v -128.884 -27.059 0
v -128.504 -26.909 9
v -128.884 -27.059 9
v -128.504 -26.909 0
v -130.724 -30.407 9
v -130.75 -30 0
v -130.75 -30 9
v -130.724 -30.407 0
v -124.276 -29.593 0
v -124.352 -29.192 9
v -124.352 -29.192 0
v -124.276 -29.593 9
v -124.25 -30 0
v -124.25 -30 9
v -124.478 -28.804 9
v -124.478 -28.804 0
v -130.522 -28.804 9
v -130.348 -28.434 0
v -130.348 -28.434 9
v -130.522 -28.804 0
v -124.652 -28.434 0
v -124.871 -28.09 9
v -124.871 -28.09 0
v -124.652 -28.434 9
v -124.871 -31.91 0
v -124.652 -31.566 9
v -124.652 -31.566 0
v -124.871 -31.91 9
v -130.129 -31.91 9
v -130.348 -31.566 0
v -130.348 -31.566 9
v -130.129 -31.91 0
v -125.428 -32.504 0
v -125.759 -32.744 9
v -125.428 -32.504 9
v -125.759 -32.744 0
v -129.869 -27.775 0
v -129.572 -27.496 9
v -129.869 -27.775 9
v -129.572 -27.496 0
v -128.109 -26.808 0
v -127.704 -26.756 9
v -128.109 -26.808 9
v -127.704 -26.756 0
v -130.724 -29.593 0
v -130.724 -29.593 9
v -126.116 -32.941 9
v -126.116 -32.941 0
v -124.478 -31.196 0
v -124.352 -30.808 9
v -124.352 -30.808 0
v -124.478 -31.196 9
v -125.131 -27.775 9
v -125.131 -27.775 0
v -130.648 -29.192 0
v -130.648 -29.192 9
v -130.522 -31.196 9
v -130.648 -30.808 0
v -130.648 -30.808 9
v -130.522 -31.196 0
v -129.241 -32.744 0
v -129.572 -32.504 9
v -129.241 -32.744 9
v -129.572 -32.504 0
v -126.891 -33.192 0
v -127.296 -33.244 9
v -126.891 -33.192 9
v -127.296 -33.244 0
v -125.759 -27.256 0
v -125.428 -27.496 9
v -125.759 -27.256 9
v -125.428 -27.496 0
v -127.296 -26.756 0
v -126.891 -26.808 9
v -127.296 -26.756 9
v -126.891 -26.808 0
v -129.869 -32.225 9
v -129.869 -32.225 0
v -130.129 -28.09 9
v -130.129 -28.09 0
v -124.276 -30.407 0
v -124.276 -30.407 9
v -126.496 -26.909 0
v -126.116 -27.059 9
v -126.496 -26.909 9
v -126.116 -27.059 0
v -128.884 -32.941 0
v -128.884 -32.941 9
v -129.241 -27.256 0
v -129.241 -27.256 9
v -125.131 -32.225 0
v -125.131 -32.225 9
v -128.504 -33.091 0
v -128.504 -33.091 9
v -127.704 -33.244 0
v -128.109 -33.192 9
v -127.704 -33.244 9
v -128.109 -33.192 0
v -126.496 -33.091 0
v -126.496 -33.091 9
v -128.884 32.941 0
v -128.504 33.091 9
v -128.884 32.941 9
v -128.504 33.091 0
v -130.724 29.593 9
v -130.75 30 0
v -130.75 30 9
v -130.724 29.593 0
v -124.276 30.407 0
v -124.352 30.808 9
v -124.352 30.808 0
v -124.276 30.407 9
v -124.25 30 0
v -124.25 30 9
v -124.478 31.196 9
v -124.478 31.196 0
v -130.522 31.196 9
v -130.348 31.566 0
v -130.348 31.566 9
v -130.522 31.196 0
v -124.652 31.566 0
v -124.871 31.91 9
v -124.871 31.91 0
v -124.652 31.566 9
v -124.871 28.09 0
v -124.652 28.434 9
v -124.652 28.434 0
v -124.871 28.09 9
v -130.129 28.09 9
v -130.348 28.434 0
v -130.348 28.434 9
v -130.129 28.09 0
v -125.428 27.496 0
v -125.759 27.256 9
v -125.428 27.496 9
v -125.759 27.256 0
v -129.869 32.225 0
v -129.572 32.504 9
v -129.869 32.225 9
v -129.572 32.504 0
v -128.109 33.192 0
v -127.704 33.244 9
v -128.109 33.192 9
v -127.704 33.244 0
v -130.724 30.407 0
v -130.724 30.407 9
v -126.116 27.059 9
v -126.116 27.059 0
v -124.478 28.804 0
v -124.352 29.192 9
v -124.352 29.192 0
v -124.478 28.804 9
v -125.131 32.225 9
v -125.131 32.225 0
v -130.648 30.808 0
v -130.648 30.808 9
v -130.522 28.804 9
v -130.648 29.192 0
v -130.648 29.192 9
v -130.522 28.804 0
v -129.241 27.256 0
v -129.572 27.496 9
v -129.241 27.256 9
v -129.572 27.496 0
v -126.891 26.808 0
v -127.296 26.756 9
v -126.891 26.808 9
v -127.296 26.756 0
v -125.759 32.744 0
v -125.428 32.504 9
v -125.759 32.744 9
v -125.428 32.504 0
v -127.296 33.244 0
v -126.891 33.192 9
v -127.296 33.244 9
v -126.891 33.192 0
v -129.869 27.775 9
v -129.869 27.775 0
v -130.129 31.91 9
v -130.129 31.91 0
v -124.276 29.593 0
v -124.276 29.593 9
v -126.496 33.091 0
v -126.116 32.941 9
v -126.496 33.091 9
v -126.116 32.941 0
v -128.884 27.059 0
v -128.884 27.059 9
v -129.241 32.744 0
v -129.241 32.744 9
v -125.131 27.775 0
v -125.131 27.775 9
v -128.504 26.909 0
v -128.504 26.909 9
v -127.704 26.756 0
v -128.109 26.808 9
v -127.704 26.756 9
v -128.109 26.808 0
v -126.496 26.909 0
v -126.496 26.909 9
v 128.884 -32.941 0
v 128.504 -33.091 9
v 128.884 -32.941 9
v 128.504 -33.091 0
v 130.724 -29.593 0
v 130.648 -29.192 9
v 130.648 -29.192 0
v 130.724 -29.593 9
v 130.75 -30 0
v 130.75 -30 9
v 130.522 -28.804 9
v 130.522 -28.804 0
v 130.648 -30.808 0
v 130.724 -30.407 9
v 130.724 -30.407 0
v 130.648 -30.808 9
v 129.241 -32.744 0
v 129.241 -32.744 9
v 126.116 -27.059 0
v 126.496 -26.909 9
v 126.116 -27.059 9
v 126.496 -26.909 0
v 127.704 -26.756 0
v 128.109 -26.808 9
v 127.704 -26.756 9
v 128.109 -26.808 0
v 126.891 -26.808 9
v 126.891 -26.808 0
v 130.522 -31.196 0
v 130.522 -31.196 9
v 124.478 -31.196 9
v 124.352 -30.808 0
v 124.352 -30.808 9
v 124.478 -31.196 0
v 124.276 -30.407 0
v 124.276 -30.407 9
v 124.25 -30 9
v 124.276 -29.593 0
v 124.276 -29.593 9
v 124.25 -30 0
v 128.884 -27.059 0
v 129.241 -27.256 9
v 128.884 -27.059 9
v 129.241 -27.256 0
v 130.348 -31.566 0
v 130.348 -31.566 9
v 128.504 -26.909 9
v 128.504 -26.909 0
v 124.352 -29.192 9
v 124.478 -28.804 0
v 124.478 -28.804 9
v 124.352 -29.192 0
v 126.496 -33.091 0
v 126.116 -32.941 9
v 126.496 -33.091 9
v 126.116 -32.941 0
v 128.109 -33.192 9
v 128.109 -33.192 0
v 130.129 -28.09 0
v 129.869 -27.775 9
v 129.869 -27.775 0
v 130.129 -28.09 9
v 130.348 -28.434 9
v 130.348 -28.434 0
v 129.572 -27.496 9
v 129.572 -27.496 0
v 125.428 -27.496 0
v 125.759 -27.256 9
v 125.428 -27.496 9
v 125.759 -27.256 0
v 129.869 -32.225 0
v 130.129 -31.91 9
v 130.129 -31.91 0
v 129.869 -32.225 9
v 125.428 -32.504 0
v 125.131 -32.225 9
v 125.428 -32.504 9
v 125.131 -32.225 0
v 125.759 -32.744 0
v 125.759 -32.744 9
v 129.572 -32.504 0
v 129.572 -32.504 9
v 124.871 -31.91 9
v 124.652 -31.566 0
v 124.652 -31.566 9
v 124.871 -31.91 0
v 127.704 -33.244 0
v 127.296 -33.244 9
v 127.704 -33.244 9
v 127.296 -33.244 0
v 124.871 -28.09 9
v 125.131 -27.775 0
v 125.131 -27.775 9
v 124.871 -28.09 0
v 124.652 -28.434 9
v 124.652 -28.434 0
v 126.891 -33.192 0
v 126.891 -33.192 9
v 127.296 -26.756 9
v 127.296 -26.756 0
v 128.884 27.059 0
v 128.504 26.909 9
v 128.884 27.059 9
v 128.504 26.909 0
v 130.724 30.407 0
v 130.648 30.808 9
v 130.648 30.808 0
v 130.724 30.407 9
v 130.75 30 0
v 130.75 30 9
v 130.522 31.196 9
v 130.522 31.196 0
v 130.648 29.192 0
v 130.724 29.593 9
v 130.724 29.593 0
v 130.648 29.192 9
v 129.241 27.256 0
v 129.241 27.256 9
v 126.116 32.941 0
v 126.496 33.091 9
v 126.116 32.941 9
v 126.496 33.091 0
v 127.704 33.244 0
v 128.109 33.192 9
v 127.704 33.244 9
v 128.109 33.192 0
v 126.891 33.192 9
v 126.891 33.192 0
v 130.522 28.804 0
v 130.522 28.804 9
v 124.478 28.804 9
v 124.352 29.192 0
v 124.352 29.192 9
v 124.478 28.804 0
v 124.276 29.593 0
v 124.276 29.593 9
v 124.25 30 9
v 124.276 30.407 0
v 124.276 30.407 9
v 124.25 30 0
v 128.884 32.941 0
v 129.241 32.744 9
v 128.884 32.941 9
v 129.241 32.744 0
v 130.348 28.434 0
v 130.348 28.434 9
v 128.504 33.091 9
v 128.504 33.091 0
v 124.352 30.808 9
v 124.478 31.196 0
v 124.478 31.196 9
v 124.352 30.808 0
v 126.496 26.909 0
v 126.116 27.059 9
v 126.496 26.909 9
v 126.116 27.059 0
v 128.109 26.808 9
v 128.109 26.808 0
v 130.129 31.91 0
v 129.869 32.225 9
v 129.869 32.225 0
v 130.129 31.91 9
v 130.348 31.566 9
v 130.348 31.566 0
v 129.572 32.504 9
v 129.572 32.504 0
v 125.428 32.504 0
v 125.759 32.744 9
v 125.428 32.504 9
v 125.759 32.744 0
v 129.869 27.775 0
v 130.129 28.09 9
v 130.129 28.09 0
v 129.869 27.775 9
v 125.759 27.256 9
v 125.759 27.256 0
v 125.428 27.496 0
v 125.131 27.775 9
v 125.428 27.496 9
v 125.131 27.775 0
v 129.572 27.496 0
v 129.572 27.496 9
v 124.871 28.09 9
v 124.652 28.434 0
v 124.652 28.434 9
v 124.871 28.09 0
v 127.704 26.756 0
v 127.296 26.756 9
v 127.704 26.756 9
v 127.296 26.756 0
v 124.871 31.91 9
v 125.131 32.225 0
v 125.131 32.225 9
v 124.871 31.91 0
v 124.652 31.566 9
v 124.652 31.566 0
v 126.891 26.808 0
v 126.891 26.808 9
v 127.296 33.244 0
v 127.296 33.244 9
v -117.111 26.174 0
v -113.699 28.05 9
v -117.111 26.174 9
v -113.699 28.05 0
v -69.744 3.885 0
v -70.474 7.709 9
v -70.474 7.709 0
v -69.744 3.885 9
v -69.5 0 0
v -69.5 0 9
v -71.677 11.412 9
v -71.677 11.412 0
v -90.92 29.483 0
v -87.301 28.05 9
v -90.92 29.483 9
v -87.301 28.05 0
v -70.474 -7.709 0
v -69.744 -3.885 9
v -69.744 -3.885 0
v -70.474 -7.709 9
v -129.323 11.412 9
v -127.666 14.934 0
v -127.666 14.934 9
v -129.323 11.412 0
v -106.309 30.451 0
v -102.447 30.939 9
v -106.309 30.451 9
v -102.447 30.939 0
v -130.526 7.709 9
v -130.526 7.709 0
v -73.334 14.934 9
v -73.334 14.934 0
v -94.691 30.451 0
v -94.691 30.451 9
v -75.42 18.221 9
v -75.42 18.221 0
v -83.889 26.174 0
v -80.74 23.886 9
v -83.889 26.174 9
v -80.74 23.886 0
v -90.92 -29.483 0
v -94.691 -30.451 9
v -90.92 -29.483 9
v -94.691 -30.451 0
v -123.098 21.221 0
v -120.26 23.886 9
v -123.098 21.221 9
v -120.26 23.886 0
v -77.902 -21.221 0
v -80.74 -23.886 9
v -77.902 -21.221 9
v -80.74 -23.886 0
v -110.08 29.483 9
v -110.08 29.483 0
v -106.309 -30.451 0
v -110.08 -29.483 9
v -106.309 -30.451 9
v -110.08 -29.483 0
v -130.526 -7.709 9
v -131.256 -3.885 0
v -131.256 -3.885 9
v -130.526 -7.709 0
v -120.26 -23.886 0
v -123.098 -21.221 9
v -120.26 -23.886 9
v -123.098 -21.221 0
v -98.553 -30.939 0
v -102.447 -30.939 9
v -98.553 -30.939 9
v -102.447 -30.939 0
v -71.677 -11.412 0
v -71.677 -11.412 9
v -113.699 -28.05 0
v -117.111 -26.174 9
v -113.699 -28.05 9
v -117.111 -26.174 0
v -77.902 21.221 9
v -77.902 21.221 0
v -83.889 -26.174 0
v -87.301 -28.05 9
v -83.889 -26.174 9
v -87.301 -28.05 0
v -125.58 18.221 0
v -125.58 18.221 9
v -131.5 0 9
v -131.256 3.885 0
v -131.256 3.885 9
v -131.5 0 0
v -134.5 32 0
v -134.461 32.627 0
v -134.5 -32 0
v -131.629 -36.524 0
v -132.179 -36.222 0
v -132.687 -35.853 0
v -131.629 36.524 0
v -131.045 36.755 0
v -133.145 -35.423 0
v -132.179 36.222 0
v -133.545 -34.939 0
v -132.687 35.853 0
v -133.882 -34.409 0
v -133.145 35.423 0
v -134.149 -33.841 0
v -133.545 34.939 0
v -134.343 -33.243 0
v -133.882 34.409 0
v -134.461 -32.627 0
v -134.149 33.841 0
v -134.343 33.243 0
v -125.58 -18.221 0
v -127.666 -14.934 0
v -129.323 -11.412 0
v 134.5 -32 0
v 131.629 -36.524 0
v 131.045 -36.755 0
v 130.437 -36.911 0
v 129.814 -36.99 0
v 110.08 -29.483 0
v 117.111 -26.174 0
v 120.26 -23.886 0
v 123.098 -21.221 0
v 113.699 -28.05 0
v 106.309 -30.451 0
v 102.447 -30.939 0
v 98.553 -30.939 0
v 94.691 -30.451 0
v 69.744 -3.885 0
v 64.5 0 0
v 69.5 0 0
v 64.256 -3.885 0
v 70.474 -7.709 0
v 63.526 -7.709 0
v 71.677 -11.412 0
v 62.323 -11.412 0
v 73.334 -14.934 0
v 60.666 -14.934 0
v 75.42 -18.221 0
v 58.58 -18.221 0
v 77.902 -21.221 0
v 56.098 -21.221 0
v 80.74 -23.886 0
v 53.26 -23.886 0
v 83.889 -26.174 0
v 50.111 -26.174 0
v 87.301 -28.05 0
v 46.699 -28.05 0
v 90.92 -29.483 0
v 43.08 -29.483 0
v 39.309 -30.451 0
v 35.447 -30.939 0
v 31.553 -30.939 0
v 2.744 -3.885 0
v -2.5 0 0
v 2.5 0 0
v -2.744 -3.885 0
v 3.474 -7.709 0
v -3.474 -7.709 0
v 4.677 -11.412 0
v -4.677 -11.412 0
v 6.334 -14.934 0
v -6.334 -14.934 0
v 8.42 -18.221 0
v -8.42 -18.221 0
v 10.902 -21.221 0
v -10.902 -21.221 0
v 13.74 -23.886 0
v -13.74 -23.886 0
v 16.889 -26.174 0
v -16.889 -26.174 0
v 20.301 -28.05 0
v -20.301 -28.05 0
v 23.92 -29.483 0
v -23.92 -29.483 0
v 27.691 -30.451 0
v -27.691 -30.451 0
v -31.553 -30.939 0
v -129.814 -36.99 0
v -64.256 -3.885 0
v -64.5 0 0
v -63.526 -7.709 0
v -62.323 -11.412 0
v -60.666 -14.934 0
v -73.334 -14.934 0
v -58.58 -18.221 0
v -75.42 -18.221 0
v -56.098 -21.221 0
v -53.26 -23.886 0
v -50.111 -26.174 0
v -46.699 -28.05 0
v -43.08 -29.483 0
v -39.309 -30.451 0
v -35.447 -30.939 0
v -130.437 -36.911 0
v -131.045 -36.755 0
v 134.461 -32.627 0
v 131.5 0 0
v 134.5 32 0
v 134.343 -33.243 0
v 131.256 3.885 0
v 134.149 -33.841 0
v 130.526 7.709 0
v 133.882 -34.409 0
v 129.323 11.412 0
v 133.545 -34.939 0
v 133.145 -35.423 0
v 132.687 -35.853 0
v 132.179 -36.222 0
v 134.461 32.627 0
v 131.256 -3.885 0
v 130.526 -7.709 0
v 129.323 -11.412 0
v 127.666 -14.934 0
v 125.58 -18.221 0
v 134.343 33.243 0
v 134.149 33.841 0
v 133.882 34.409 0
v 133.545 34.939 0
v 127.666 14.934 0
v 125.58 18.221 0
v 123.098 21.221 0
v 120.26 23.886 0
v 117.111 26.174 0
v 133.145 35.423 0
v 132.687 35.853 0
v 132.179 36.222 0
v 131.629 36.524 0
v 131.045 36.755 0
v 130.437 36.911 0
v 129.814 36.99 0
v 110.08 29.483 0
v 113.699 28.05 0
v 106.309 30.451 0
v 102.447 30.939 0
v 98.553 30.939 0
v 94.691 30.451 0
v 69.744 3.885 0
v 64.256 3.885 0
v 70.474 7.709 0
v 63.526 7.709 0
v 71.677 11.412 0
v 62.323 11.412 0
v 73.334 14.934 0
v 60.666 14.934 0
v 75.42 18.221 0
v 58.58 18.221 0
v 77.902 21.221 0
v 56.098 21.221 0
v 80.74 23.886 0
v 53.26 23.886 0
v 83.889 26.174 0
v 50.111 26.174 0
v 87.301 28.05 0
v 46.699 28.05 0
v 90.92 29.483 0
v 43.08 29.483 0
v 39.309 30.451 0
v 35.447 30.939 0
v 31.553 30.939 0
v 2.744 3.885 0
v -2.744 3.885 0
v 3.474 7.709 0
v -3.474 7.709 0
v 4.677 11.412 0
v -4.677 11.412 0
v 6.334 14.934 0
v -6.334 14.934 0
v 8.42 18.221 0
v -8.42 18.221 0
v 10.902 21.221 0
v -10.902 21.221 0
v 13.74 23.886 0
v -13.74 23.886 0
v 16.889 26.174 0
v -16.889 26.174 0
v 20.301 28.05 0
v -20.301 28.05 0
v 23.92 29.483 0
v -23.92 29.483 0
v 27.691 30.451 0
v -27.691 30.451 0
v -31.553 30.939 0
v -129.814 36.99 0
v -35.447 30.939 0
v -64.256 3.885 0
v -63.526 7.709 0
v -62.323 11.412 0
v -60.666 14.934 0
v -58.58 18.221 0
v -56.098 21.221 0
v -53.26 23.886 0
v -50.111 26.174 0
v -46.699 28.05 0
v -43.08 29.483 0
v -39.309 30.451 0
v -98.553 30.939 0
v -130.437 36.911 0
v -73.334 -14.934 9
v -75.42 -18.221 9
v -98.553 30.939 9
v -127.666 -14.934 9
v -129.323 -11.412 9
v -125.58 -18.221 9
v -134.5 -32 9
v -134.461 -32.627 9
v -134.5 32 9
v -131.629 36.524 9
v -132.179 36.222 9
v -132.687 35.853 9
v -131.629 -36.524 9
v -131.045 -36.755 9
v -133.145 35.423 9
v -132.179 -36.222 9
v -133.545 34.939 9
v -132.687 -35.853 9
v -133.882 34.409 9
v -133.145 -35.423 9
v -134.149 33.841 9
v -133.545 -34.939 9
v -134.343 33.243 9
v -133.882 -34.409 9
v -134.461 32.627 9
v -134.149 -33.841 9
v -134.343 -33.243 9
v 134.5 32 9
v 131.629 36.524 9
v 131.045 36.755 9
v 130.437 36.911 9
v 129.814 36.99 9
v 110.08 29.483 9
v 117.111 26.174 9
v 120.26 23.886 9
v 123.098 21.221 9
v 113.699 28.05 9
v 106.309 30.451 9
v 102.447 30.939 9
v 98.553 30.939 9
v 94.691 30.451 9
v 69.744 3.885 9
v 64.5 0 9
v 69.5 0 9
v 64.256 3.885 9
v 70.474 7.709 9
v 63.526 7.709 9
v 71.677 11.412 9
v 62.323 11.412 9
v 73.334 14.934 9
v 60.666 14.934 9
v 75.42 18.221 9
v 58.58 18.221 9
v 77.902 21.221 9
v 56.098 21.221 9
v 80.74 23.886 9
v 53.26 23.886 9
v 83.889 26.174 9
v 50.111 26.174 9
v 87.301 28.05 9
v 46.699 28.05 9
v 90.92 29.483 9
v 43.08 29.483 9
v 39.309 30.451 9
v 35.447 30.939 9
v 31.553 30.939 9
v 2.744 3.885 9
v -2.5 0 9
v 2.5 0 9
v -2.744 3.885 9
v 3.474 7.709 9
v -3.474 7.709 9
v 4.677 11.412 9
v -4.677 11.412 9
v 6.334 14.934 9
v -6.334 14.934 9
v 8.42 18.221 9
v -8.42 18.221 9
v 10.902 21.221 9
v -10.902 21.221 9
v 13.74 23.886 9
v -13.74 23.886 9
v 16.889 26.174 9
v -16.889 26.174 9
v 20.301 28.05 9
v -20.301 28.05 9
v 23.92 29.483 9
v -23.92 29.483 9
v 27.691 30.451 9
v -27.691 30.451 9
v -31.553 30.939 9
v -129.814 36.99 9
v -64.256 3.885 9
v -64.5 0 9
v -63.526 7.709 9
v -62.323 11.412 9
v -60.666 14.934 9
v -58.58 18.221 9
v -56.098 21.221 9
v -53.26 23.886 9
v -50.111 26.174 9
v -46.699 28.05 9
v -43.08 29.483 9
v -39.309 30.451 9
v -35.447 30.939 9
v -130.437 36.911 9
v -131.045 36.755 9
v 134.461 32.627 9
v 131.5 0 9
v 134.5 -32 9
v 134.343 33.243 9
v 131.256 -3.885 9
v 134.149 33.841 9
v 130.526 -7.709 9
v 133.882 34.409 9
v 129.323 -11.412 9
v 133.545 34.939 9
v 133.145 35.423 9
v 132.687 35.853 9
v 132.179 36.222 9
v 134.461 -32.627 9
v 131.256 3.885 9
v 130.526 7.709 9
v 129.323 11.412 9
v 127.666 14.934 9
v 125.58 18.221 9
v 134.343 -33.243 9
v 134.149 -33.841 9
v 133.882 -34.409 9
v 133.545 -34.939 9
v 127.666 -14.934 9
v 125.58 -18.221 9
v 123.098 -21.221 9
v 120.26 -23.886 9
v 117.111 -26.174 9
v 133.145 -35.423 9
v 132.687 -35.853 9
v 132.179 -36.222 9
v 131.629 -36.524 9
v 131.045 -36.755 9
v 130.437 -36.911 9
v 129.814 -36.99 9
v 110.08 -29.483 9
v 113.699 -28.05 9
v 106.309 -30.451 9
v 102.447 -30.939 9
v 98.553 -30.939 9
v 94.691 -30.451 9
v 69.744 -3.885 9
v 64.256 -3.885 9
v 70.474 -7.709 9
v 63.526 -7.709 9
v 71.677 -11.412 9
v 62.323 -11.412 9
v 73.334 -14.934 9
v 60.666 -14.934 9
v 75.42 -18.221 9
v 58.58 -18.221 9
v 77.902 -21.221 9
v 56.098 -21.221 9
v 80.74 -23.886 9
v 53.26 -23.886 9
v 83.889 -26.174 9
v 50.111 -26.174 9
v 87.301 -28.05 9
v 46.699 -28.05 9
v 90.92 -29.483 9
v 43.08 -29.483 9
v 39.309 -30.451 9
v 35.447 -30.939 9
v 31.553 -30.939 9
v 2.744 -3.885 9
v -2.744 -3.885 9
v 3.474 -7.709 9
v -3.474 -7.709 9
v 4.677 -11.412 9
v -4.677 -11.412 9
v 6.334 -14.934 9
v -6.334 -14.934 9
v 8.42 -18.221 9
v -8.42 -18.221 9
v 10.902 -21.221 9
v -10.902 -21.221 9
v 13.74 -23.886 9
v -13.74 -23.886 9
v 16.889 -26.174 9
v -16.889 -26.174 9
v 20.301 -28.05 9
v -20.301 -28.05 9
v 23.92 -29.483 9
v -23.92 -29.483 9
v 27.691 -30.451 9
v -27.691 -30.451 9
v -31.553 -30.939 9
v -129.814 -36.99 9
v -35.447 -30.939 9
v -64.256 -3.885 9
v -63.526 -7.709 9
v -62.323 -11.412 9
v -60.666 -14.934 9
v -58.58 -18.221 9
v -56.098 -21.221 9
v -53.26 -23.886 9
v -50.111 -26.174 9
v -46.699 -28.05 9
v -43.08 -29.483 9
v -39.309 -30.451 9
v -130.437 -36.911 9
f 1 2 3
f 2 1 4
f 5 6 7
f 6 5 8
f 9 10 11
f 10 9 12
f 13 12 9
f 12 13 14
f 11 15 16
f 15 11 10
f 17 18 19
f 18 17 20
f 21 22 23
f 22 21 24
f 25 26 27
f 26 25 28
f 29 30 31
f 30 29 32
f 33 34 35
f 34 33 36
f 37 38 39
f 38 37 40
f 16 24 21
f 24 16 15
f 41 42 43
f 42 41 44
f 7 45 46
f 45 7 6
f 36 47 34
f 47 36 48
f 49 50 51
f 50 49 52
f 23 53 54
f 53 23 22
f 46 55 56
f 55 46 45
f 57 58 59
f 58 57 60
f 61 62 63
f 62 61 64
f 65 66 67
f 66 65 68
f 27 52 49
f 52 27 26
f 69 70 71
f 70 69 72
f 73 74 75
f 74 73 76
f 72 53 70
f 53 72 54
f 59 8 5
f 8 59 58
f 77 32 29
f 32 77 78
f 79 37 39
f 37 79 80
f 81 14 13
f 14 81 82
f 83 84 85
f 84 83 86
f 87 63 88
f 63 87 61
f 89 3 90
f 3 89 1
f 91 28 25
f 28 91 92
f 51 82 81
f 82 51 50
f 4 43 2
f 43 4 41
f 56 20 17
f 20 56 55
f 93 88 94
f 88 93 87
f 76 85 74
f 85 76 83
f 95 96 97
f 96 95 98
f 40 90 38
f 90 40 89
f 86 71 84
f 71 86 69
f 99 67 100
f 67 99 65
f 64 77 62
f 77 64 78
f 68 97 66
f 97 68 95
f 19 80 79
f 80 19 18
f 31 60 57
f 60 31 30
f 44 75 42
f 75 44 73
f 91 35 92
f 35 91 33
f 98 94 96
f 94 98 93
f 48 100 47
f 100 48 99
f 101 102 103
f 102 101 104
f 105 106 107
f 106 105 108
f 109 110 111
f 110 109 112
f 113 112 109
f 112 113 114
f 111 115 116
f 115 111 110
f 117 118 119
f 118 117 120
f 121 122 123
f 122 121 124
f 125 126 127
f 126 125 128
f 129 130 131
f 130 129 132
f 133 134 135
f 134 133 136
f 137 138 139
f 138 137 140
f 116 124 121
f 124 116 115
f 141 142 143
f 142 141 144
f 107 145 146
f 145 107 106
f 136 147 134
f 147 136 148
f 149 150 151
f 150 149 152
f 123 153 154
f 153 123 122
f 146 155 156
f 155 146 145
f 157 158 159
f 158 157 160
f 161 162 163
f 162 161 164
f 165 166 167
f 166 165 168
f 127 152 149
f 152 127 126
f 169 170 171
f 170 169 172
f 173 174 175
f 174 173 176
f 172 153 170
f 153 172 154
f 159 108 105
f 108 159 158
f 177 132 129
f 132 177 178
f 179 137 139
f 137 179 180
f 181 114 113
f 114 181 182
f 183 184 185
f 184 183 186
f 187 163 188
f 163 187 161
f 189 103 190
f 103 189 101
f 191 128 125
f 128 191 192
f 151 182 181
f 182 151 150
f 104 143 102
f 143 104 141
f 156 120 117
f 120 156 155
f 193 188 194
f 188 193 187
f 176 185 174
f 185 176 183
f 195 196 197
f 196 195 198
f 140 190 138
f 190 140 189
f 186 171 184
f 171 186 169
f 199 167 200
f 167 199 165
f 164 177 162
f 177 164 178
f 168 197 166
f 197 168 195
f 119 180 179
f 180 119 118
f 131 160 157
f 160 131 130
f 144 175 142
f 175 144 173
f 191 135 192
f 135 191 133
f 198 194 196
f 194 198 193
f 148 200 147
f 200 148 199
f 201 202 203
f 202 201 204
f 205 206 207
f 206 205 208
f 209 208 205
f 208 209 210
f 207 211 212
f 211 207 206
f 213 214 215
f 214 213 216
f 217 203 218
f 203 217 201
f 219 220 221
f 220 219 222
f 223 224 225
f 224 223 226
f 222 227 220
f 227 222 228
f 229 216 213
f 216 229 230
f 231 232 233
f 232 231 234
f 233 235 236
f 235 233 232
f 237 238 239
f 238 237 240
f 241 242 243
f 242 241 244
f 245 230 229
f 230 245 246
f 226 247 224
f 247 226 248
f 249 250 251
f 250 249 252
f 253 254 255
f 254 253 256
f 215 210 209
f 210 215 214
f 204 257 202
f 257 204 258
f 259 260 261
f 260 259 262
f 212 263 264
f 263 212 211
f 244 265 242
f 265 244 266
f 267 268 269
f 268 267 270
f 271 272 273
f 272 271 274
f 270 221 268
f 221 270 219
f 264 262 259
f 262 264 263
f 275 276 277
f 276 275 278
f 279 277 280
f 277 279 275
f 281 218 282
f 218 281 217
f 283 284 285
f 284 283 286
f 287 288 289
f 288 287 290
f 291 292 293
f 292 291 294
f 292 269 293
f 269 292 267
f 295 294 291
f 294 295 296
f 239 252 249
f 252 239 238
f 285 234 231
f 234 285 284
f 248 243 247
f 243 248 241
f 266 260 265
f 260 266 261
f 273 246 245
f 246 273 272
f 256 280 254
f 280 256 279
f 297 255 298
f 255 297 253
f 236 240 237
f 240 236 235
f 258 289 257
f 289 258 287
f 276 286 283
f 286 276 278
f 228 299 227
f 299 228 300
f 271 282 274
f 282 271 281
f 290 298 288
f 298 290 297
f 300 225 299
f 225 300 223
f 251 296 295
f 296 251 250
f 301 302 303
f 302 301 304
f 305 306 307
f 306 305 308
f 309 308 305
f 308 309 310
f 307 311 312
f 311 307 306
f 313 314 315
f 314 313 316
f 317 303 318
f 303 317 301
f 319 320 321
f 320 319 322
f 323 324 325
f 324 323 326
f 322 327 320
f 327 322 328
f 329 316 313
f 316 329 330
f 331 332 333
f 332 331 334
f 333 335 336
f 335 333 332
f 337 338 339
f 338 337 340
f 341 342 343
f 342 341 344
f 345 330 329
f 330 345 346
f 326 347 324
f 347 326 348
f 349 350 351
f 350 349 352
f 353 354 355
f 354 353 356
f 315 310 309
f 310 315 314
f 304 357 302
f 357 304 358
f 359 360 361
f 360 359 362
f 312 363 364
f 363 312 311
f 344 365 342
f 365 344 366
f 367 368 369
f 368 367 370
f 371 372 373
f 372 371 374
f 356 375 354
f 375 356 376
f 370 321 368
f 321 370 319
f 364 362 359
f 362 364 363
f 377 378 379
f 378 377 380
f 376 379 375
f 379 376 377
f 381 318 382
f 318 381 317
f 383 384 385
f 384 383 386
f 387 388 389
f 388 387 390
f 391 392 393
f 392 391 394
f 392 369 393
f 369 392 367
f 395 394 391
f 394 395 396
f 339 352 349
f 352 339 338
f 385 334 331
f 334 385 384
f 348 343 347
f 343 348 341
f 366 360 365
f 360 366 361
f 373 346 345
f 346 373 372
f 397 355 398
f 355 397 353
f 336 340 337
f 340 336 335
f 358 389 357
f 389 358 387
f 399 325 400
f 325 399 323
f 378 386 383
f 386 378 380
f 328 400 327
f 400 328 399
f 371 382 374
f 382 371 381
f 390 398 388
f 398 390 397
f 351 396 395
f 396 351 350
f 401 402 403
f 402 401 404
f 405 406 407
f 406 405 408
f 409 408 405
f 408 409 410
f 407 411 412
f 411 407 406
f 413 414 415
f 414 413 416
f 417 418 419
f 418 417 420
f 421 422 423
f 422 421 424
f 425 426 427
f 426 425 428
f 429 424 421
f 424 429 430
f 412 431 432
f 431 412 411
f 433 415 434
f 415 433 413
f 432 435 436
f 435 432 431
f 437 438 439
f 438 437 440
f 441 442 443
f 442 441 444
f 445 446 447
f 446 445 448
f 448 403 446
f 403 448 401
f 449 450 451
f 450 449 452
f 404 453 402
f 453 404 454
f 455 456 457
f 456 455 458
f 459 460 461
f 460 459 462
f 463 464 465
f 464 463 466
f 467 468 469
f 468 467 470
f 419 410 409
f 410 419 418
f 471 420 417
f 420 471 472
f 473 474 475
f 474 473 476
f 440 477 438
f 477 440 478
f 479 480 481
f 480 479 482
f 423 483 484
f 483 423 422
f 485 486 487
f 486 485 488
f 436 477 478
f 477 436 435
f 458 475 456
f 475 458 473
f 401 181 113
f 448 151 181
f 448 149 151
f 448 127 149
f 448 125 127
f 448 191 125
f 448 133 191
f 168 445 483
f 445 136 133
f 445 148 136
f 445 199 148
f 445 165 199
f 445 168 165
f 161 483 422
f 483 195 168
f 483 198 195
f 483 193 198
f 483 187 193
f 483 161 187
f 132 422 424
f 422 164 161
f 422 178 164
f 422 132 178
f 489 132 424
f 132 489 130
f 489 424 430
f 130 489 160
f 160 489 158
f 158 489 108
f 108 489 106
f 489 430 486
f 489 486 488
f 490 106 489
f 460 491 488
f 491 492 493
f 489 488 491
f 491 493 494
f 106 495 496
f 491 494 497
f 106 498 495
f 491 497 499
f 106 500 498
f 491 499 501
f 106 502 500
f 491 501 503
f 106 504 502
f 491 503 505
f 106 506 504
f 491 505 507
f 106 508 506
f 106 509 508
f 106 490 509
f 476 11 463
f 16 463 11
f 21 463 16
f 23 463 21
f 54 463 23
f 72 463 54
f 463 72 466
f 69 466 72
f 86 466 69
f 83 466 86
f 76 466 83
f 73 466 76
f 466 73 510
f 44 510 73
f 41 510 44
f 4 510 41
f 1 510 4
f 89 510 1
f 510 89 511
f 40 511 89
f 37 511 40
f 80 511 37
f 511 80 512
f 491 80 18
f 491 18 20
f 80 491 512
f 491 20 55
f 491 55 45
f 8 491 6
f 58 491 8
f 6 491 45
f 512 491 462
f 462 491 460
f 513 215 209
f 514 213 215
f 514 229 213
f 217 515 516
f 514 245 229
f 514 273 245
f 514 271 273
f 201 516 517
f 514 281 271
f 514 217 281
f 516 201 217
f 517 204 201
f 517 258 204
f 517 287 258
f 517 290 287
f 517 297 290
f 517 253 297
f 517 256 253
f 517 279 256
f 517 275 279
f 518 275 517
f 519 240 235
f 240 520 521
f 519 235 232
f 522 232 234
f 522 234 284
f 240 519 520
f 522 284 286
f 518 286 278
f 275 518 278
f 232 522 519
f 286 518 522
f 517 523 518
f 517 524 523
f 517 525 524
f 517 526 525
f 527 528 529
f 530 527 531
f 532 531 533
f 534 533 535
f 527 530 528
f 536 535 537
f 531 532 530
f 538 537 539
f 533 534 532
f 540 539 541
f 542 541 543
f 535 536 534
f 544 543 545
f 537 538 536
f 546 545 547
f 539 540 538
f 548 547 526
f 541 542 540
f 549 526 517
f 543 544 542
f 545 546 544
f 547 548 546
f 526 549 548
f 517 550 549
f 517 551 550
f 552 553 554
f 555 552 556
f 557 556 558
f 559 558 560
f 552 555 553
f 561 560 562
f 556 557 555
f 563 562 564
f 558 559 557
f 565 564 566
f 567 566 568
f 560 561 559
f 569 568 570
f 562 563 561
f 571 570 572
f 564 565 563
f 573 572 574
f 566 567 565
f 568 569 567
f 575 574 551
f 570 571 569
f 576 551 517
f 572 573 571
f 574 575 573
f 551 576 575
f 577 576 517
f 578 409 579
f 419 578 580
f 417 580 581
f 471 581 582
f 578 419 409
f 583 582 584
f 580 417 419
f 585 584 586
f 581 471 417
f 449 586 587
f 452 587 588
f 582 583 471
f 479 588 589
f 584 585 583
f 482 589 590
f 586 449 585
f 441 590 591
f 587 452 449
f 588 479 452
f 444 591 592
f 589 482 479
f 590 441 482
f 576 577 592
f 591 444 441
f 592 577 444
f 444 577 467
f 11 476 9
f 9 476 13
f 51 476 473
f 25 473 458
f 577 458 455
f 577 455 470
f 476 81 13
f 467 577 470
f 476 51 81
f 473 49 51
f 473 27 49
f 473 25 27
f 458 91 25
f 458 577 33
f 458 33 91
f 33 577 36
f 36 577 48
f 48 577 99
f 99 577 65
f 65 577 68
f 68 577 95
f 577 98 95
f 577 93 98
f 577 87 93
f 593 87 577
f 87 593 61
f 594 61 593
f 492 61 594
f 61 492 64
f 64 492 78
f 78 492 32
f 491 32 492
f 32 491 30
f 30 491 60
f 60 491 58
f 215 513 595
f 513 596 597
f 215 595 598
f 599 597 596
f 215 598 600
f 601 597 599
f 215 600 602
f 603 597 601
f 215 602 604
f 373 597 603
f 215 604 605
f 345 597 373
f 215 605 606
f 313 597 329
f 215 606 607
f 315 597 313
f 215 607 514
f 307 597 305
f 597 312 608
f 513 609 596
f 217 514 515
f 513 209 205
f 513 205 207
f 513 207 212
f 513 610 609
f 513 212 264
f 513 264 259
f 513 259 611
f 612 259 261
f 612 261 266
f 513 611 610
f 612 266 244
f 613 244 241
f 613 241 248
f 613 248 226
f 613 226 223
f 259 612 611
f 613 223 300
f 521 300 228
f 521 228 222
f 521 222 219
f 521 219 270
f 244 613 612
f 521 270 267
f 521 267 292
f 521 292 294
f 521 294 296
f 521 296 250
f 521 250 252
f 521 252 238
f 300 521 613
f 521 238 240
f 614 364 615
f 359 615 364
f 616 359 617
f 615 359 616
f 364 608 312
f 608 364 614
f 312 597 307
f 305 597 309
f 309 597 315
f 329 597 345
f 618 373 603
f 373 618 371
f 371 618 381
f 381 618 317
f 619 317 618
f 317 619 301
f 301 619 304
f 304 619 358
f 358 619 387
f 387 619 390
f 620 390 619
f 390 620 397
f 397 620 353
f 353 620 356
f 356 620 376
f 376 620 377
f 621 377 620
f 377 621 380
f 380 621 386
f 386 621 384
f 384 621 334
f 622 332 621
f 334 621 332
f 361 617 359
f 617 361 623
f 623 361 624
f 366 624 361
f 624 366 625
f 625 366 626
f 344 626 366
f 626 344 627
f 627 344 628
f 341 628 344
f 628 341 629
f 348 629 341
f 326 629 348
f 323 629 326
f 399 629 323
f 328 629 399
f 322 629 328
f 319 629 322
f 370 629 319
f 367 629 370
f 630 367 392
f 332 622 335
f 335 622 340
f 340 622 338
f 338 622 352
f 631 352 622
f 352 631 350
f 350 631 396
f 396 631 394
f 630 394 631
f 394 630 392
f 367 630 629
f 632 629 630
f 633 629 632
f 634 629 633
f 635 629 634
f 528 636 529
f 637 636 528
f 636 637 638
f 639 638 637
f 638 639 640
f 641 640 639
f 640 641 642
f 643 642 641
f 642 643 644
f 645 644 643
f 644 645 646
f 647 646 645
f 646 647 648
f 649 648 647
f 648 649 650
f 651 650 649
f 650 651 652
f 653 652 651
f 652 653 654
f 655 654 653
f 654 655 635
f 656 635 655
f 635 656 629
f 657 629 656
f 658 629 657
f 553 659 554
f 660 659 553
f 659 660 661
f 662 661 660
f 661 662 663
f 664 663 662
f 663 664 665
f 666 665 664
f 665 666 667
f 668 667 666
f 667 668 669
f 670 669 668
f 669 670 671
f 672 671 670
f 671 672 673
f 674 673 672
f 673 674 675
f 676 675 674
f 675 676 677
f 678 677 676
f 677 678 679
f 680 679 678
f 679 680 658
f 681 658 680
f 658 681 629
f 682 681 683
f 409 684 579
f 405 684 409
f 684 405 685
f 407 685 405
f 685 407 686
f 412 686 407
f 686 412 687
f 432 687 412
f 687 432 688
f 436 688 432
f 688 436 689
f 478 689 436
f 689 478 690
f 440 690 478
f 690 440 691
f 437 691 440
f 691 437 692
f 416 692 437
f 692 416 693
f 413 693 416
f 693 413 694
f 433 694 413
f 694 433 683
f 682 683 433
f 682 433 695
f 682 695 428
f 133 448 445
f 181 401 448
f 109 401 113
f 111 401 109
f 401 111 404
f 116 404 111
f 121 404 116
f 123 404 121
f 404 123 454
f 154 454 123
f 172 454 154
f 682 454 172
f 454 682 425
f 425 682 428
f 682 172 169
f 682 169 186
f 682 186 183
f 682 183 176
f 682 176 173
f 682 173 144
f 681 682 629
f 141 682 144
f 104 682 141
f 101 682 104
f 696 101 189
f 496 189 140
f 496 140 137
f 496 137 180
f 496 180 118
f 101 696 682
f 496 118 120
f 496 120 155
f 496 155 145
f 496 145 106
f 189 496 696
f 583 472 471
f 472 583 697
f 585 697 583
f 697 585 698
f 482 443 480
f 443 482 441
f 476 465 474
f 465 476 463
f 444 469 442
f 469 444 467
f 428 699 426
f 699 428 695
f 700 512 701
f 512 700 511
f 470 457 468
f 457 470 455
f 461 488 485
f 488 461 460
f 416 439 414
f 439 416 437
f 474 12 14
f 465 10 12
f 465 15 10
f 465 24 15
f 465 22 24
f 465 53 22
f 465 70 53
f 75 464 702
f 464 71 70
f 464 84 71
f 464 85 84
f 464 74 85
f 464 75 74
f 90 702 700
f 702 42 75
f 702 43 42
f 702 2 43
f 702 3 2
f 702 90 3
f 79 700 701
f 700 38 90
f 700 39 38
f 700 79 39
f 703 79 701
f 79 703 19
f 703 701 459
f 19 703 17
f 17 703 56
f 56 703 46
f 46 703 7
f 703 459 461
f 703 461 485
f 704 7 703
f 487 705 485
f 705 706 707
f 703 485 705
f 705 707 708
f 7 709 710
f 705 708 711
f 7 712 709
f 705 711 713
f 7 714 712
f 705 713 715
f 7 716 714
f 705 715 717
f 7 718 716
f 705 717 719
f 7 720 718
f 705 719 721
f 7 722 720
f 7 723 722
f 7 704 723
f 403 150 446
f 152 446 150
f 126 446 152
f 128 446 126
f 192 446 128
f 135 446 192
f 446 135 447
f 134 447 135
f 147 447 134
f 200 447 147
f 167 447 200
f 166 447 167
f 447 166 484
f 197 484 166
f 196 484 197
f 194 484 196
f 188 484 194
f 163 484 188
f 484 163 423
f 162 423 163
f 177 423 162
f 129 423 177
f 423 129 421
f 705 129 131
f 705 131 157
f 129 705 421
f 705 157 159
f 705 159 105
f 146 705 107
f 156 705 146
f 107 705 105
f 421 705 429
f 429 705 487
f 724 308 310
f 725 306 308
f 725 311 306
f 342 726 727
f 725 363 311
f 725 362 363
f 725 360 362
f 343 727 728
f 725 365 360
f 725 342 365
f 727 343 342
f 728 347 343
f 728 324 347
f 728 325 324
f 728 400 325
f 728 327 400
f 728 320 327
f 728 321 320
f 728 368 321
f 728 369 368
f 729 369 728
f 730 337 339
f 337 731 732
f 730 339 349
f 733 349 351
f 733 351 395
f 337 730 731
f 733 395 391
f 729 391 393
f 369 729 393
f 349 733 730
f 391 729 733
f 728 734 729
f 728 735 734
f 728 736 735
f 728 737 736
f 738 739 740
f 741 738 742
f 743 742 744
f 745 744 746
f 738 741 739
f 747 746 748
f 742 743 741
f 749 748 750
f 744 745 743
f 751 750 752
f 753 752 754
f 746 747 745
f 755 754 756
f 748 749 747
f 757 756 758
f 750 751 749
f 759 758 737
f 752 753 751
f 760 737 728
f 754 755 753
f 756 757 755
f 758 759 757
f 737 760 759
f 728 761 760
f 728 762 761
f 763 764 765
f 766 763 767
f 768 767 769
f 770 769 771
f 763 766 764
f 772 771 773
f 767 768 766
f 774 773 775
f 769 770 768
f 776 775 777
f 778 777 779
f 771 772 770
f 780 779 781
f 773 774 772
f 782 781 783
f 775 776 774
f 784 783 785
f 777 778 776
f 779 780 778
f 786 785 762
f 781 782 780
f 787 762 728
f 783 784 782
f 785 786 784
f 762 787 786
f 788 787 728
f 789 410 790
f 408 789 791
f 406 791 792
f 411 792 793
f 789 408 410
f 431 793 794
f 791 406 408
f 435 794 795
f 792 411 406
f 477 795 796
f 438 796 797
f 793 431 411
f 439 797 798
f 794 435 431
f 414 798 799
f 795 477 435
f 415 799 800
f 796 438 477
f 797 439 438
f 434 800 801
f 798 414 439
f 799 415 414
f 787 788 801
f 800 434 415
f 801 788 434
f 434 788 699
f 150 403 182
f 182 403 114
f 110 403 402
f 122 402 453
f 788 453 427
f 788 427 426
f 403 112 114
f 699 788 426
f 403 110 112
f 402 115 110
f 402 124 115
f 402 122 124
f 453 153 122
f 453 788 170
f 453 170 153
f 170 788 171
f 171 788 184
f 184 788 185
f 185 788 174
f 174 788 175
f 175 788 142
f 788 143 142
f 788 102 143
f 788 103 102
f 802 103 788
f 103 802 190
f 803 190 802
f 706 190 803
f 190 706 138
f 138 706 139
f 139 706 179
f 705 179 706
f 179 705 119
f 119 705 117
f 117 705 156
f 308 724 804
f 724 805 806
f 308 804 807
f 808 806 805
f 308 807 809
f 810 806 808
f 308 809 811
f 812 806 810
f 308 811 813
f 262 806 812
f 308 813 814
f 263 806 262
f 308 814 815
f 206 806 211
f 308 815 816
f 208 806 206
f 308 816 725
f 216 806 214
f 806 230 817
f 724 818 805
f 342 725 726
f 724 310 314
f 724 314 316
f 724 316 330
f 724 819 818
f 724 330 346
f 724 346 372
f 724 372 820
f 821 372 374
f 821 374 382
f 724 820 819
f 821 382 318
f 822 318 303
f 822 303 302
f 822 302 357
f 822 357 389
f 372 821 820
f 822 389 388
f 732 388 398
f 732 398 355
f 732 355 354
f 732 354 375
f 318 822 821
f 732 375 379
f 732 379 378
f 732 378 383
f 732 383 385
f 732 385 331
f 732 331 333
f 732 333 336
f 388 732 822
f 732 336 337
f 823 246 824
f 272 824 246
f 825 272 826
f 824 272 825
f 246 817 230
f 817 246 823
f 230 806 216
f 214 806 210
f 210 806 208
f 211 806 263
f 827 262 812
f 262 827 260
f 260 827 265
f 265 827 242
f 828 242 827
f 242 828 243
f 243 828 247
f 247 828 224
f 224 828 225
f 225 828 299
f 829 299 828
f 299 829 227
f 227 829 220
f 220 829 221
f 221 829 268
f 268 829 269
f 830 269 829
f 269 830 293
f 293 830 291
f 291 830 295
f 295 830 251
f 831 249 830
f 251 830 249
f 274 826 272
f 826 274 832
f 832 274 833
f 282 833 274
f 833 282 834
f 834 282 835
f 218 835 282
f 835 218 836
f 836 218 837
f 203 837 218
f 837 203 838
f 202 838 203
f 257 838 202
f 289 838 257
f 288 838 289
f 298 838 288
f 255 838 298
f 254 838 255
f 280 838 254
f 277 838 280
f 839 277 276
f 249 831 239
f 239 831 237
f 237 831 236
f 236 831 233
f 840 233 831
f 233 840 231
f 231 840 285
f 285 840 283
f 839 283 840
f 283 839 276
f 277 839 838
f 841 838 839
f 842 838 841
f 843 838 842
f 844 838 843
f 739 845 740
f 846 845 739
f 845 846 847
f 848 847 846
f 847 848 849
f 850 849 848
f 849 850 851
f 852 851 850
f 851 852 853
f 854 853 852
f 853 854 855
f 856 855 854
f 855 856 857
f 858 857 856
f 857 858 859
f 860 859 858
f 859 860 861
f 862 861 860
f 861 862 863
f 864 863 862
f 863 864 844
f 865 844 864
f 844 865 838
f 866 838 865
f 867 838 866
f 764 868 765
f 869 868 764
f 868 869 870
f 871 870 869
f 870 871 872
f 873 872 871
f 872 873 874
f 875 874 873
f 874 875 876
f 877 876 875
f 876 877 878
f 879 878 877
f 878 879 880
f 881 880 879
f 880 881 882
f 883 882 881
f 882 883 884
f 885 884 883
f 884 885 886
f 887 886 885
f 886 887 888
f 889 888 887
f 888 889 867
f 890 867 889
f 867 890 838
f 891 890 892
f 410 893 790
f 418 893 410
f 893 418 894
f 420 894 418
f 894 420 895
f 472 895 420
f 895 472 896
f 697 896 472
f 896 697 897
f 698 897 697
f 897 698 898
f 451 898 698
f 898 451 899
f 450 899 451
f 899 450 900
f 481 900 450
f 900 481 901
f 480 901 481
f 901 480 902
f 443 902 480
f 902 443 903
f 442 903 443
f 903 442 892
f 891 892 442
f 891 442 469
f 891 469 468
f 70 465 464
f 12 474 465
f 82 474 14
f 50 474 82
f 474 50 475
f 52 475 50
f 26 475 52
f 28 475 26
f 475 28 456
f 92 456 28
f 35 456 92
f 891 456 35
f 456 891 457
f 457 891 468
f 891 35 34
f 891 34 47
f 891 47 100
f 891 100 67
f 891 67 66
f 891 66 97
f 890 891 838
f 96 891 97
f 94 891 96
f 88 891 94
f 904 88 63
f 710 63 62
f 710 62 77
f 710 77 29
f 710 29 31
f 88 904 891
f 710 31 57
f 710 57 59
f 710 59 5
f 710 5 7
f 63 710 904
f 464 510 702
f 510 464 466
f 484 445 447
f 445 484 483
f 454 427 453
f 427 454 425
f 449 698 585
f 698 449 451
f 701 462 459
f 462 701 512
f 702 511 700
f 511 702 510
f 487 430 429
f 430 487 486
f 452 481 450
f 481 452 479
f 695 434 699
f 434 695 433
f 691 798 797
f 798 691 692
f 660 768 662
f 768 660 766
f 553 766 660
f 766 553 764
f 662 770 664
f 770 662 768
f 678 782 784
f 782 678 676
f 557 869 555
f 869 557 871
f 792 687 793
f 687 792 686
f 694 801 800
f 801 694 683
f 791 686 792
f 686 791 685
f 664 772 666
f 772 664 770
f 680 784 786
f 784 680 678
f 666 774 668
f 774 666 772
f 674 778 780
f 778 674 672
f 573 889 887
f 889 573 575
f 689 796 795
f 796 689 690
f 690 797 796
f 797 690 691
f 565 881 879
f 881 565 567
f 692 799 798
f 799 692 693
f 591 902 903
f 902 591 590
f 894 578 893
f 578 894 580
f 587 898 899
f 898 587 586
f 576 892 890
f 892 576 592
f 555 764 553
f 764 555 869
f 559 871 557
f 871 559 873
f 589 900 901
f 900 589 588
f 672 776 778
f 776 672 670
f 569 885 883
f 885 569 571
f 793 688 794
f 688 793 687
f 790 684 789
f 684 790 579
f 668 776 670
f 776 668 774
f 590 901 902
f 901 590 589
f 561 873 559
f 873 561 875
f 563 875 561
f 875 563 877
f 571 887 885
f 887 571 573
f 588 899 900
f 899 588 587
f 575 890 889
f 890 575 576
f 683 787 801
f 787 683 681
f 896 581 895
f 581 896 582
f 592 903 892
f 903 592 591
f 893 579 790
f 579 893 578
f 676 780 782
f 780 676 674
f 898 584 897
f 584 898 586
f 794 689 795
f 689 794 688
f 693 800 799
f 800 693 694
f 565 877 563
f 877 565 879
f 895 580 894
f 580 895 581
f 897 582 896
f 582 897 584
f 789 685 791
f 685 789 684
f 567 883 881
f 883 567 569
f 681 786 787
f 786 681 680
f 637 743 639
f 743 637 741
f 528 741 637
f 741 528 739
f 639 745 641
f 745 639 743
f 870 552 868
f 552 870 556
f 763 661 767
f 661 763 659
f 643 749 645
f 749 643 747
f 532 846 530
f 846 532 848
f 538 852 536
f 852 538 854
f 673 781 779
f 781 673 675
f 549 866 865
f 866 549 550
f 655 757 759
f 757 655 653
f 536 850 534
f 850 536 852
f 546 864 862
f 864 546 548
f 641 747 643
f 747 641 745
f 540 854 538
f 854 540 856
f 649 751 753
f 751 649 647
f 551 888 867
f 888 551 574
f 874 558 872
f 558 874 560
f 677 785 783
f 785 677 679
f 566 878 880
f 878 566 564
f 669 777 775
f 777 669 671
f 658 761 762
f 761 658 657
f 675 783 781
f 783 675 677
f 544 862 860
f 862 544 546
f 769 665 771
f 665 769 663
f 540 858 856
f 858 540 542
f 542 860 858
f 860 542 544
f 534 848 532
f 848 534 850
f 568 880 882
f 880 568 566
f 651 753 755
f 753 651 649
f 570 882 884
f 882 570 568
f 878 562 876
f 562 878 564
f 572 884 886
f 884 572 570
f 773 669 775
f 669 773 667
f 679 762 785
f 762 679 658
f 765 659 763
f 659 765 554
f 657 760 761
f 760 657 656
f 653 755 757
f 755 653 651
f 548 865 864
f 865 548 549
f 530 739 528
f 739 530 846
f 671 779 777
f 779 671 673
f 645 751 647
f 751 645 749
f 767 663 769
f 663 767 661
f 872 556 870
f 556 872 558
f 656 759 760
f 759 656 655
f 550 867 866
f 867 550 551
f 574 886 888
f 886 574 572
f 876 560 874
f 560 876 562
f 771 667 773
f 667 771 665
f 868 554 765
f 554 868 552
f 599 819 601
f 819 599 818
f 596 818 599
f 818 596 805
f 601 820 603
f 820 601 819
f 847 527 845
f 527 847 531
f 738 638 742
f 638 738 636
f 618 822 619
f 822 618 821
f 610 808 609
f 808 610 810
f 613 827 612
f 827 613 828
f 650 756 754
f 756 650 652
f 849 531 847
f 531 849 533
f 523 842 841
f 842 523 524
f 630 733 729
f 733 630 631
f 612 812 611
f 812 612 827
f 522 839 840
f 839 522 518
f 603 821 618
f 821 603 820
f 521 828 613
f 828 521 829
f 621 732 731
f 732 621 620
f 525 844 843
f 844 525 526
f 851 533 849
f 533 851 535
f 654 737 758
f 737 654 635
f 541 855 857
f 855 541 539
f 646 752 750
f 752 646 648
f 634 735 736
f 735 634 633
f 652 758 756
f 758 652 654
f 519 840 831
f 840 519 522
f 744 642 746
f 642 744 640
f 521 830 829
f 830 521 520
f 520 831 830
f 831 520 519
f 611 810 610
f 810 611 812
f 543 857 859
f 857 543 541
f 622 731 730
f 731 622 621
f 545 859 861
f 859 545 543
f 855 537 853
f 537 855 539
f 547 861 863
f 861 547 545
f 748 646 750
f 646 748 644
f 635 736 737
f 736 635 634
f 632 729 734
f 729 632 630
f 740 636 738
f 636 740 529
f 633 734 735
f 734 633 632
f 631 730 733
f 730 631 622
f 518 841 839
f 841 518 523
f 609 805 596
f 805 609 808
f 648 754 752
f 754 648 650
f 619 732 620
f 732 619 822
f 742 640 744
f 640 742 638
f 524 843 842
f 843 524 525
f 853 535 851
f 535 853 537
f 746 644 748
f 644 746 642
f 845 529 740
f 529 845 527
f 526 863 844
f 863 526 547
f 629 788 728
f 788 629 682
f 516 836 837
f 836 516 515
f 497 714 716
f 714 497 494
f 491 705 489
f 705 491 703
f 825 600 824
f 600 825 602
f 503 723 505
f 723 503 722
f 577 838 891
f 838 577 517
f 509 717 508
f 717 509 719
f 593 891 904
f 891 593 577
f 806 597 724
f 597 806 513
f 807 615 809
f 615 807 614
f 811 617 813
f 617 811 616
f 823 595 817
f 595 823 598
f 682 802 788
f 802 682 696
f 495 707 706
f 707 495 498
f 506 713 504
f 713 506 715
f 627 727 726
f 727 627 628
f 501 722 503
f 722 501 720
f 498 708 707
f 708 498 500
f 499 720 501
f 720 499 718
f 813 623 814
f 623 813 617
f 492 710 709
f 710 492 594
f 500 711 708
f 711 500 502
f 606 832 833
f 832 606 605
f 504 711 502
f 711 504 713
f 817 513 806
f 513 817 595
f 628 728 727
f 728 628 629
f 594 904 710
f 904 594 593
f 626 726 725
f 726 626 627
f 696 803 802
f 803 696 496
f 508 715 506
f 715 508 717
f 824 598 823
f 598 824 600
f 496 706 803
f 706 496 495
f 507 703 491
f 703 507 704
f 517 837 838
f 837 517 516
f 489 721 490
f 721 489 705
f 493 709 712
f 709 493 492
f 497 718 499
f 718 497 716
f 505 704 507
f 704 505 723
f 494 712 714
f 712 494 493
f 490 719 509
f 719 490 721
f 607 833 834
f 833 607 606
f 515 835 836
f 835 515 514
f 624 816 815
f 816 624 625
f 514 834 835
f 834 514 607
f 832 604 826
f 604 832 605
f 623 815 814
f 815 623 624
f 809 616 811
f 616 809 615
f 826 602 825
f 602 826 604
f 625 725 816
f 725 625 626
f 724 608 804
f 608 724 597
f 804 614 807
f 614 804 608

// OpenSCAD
$fn = 50;


difference() {
	union() {
		hull() {
			translate(v = [-129.5000000000, 32.0000000000, 0]) {
				cylinder(h = 9, r = 5);
			}
			translate(v = [129.5000000000, 32.0000000000, 0]) {
				cylinder(h = 9, r = 5);
			}
			translate(v = [-129.5000000000, -32.0000000000, 0]) {
				cylinder(h = 9, r = 5);
			}
			translate(v = [129.5000000000, -32.0000000000, 0]) {
				cylinder(h = 9, r = 5);
			}
		}
	}
	union() {
		#translate(v = [-127.5000000000, -30.0000000000, -100.0000000000]) {
			cylinder(h = 200, r = 3.2500000000);
		}
		#translate(v = [-127.5000000000, 30.0000000000, -100.0000000000]) {
			cylinder(h = 200, r = 3.2500000000);
		}
		#translate(v = [127.5000000000, -30.0000000000, -100.0000000000]) {
			cylinder(h = 200, r = 3.2500000000);
		}
		#translate(v = [127.5000000000, 30.0000000000, -100.0000000000]) {
			cylinder(h = 200, r = 3.2500000000);
		}
		#translate(v = [-100.5000000000, 0, 0]) {
			cylinder(h = 9, r = 31.0000000000);
		}
		#translate(v = [-33.5000000000, 0, 0]) {
			cylinder(h = 9, r = 31.0000000000);
		}
		#translate(v = [33.5000000000, 0, 0]) {
			cylinder(h = 9, r = 31.0000000000);
		}
		#translate(v = [100.5000000000, 0, 0]) {
			cylinder(h = 9, r = 31.0000000000);
		}
	}
}
